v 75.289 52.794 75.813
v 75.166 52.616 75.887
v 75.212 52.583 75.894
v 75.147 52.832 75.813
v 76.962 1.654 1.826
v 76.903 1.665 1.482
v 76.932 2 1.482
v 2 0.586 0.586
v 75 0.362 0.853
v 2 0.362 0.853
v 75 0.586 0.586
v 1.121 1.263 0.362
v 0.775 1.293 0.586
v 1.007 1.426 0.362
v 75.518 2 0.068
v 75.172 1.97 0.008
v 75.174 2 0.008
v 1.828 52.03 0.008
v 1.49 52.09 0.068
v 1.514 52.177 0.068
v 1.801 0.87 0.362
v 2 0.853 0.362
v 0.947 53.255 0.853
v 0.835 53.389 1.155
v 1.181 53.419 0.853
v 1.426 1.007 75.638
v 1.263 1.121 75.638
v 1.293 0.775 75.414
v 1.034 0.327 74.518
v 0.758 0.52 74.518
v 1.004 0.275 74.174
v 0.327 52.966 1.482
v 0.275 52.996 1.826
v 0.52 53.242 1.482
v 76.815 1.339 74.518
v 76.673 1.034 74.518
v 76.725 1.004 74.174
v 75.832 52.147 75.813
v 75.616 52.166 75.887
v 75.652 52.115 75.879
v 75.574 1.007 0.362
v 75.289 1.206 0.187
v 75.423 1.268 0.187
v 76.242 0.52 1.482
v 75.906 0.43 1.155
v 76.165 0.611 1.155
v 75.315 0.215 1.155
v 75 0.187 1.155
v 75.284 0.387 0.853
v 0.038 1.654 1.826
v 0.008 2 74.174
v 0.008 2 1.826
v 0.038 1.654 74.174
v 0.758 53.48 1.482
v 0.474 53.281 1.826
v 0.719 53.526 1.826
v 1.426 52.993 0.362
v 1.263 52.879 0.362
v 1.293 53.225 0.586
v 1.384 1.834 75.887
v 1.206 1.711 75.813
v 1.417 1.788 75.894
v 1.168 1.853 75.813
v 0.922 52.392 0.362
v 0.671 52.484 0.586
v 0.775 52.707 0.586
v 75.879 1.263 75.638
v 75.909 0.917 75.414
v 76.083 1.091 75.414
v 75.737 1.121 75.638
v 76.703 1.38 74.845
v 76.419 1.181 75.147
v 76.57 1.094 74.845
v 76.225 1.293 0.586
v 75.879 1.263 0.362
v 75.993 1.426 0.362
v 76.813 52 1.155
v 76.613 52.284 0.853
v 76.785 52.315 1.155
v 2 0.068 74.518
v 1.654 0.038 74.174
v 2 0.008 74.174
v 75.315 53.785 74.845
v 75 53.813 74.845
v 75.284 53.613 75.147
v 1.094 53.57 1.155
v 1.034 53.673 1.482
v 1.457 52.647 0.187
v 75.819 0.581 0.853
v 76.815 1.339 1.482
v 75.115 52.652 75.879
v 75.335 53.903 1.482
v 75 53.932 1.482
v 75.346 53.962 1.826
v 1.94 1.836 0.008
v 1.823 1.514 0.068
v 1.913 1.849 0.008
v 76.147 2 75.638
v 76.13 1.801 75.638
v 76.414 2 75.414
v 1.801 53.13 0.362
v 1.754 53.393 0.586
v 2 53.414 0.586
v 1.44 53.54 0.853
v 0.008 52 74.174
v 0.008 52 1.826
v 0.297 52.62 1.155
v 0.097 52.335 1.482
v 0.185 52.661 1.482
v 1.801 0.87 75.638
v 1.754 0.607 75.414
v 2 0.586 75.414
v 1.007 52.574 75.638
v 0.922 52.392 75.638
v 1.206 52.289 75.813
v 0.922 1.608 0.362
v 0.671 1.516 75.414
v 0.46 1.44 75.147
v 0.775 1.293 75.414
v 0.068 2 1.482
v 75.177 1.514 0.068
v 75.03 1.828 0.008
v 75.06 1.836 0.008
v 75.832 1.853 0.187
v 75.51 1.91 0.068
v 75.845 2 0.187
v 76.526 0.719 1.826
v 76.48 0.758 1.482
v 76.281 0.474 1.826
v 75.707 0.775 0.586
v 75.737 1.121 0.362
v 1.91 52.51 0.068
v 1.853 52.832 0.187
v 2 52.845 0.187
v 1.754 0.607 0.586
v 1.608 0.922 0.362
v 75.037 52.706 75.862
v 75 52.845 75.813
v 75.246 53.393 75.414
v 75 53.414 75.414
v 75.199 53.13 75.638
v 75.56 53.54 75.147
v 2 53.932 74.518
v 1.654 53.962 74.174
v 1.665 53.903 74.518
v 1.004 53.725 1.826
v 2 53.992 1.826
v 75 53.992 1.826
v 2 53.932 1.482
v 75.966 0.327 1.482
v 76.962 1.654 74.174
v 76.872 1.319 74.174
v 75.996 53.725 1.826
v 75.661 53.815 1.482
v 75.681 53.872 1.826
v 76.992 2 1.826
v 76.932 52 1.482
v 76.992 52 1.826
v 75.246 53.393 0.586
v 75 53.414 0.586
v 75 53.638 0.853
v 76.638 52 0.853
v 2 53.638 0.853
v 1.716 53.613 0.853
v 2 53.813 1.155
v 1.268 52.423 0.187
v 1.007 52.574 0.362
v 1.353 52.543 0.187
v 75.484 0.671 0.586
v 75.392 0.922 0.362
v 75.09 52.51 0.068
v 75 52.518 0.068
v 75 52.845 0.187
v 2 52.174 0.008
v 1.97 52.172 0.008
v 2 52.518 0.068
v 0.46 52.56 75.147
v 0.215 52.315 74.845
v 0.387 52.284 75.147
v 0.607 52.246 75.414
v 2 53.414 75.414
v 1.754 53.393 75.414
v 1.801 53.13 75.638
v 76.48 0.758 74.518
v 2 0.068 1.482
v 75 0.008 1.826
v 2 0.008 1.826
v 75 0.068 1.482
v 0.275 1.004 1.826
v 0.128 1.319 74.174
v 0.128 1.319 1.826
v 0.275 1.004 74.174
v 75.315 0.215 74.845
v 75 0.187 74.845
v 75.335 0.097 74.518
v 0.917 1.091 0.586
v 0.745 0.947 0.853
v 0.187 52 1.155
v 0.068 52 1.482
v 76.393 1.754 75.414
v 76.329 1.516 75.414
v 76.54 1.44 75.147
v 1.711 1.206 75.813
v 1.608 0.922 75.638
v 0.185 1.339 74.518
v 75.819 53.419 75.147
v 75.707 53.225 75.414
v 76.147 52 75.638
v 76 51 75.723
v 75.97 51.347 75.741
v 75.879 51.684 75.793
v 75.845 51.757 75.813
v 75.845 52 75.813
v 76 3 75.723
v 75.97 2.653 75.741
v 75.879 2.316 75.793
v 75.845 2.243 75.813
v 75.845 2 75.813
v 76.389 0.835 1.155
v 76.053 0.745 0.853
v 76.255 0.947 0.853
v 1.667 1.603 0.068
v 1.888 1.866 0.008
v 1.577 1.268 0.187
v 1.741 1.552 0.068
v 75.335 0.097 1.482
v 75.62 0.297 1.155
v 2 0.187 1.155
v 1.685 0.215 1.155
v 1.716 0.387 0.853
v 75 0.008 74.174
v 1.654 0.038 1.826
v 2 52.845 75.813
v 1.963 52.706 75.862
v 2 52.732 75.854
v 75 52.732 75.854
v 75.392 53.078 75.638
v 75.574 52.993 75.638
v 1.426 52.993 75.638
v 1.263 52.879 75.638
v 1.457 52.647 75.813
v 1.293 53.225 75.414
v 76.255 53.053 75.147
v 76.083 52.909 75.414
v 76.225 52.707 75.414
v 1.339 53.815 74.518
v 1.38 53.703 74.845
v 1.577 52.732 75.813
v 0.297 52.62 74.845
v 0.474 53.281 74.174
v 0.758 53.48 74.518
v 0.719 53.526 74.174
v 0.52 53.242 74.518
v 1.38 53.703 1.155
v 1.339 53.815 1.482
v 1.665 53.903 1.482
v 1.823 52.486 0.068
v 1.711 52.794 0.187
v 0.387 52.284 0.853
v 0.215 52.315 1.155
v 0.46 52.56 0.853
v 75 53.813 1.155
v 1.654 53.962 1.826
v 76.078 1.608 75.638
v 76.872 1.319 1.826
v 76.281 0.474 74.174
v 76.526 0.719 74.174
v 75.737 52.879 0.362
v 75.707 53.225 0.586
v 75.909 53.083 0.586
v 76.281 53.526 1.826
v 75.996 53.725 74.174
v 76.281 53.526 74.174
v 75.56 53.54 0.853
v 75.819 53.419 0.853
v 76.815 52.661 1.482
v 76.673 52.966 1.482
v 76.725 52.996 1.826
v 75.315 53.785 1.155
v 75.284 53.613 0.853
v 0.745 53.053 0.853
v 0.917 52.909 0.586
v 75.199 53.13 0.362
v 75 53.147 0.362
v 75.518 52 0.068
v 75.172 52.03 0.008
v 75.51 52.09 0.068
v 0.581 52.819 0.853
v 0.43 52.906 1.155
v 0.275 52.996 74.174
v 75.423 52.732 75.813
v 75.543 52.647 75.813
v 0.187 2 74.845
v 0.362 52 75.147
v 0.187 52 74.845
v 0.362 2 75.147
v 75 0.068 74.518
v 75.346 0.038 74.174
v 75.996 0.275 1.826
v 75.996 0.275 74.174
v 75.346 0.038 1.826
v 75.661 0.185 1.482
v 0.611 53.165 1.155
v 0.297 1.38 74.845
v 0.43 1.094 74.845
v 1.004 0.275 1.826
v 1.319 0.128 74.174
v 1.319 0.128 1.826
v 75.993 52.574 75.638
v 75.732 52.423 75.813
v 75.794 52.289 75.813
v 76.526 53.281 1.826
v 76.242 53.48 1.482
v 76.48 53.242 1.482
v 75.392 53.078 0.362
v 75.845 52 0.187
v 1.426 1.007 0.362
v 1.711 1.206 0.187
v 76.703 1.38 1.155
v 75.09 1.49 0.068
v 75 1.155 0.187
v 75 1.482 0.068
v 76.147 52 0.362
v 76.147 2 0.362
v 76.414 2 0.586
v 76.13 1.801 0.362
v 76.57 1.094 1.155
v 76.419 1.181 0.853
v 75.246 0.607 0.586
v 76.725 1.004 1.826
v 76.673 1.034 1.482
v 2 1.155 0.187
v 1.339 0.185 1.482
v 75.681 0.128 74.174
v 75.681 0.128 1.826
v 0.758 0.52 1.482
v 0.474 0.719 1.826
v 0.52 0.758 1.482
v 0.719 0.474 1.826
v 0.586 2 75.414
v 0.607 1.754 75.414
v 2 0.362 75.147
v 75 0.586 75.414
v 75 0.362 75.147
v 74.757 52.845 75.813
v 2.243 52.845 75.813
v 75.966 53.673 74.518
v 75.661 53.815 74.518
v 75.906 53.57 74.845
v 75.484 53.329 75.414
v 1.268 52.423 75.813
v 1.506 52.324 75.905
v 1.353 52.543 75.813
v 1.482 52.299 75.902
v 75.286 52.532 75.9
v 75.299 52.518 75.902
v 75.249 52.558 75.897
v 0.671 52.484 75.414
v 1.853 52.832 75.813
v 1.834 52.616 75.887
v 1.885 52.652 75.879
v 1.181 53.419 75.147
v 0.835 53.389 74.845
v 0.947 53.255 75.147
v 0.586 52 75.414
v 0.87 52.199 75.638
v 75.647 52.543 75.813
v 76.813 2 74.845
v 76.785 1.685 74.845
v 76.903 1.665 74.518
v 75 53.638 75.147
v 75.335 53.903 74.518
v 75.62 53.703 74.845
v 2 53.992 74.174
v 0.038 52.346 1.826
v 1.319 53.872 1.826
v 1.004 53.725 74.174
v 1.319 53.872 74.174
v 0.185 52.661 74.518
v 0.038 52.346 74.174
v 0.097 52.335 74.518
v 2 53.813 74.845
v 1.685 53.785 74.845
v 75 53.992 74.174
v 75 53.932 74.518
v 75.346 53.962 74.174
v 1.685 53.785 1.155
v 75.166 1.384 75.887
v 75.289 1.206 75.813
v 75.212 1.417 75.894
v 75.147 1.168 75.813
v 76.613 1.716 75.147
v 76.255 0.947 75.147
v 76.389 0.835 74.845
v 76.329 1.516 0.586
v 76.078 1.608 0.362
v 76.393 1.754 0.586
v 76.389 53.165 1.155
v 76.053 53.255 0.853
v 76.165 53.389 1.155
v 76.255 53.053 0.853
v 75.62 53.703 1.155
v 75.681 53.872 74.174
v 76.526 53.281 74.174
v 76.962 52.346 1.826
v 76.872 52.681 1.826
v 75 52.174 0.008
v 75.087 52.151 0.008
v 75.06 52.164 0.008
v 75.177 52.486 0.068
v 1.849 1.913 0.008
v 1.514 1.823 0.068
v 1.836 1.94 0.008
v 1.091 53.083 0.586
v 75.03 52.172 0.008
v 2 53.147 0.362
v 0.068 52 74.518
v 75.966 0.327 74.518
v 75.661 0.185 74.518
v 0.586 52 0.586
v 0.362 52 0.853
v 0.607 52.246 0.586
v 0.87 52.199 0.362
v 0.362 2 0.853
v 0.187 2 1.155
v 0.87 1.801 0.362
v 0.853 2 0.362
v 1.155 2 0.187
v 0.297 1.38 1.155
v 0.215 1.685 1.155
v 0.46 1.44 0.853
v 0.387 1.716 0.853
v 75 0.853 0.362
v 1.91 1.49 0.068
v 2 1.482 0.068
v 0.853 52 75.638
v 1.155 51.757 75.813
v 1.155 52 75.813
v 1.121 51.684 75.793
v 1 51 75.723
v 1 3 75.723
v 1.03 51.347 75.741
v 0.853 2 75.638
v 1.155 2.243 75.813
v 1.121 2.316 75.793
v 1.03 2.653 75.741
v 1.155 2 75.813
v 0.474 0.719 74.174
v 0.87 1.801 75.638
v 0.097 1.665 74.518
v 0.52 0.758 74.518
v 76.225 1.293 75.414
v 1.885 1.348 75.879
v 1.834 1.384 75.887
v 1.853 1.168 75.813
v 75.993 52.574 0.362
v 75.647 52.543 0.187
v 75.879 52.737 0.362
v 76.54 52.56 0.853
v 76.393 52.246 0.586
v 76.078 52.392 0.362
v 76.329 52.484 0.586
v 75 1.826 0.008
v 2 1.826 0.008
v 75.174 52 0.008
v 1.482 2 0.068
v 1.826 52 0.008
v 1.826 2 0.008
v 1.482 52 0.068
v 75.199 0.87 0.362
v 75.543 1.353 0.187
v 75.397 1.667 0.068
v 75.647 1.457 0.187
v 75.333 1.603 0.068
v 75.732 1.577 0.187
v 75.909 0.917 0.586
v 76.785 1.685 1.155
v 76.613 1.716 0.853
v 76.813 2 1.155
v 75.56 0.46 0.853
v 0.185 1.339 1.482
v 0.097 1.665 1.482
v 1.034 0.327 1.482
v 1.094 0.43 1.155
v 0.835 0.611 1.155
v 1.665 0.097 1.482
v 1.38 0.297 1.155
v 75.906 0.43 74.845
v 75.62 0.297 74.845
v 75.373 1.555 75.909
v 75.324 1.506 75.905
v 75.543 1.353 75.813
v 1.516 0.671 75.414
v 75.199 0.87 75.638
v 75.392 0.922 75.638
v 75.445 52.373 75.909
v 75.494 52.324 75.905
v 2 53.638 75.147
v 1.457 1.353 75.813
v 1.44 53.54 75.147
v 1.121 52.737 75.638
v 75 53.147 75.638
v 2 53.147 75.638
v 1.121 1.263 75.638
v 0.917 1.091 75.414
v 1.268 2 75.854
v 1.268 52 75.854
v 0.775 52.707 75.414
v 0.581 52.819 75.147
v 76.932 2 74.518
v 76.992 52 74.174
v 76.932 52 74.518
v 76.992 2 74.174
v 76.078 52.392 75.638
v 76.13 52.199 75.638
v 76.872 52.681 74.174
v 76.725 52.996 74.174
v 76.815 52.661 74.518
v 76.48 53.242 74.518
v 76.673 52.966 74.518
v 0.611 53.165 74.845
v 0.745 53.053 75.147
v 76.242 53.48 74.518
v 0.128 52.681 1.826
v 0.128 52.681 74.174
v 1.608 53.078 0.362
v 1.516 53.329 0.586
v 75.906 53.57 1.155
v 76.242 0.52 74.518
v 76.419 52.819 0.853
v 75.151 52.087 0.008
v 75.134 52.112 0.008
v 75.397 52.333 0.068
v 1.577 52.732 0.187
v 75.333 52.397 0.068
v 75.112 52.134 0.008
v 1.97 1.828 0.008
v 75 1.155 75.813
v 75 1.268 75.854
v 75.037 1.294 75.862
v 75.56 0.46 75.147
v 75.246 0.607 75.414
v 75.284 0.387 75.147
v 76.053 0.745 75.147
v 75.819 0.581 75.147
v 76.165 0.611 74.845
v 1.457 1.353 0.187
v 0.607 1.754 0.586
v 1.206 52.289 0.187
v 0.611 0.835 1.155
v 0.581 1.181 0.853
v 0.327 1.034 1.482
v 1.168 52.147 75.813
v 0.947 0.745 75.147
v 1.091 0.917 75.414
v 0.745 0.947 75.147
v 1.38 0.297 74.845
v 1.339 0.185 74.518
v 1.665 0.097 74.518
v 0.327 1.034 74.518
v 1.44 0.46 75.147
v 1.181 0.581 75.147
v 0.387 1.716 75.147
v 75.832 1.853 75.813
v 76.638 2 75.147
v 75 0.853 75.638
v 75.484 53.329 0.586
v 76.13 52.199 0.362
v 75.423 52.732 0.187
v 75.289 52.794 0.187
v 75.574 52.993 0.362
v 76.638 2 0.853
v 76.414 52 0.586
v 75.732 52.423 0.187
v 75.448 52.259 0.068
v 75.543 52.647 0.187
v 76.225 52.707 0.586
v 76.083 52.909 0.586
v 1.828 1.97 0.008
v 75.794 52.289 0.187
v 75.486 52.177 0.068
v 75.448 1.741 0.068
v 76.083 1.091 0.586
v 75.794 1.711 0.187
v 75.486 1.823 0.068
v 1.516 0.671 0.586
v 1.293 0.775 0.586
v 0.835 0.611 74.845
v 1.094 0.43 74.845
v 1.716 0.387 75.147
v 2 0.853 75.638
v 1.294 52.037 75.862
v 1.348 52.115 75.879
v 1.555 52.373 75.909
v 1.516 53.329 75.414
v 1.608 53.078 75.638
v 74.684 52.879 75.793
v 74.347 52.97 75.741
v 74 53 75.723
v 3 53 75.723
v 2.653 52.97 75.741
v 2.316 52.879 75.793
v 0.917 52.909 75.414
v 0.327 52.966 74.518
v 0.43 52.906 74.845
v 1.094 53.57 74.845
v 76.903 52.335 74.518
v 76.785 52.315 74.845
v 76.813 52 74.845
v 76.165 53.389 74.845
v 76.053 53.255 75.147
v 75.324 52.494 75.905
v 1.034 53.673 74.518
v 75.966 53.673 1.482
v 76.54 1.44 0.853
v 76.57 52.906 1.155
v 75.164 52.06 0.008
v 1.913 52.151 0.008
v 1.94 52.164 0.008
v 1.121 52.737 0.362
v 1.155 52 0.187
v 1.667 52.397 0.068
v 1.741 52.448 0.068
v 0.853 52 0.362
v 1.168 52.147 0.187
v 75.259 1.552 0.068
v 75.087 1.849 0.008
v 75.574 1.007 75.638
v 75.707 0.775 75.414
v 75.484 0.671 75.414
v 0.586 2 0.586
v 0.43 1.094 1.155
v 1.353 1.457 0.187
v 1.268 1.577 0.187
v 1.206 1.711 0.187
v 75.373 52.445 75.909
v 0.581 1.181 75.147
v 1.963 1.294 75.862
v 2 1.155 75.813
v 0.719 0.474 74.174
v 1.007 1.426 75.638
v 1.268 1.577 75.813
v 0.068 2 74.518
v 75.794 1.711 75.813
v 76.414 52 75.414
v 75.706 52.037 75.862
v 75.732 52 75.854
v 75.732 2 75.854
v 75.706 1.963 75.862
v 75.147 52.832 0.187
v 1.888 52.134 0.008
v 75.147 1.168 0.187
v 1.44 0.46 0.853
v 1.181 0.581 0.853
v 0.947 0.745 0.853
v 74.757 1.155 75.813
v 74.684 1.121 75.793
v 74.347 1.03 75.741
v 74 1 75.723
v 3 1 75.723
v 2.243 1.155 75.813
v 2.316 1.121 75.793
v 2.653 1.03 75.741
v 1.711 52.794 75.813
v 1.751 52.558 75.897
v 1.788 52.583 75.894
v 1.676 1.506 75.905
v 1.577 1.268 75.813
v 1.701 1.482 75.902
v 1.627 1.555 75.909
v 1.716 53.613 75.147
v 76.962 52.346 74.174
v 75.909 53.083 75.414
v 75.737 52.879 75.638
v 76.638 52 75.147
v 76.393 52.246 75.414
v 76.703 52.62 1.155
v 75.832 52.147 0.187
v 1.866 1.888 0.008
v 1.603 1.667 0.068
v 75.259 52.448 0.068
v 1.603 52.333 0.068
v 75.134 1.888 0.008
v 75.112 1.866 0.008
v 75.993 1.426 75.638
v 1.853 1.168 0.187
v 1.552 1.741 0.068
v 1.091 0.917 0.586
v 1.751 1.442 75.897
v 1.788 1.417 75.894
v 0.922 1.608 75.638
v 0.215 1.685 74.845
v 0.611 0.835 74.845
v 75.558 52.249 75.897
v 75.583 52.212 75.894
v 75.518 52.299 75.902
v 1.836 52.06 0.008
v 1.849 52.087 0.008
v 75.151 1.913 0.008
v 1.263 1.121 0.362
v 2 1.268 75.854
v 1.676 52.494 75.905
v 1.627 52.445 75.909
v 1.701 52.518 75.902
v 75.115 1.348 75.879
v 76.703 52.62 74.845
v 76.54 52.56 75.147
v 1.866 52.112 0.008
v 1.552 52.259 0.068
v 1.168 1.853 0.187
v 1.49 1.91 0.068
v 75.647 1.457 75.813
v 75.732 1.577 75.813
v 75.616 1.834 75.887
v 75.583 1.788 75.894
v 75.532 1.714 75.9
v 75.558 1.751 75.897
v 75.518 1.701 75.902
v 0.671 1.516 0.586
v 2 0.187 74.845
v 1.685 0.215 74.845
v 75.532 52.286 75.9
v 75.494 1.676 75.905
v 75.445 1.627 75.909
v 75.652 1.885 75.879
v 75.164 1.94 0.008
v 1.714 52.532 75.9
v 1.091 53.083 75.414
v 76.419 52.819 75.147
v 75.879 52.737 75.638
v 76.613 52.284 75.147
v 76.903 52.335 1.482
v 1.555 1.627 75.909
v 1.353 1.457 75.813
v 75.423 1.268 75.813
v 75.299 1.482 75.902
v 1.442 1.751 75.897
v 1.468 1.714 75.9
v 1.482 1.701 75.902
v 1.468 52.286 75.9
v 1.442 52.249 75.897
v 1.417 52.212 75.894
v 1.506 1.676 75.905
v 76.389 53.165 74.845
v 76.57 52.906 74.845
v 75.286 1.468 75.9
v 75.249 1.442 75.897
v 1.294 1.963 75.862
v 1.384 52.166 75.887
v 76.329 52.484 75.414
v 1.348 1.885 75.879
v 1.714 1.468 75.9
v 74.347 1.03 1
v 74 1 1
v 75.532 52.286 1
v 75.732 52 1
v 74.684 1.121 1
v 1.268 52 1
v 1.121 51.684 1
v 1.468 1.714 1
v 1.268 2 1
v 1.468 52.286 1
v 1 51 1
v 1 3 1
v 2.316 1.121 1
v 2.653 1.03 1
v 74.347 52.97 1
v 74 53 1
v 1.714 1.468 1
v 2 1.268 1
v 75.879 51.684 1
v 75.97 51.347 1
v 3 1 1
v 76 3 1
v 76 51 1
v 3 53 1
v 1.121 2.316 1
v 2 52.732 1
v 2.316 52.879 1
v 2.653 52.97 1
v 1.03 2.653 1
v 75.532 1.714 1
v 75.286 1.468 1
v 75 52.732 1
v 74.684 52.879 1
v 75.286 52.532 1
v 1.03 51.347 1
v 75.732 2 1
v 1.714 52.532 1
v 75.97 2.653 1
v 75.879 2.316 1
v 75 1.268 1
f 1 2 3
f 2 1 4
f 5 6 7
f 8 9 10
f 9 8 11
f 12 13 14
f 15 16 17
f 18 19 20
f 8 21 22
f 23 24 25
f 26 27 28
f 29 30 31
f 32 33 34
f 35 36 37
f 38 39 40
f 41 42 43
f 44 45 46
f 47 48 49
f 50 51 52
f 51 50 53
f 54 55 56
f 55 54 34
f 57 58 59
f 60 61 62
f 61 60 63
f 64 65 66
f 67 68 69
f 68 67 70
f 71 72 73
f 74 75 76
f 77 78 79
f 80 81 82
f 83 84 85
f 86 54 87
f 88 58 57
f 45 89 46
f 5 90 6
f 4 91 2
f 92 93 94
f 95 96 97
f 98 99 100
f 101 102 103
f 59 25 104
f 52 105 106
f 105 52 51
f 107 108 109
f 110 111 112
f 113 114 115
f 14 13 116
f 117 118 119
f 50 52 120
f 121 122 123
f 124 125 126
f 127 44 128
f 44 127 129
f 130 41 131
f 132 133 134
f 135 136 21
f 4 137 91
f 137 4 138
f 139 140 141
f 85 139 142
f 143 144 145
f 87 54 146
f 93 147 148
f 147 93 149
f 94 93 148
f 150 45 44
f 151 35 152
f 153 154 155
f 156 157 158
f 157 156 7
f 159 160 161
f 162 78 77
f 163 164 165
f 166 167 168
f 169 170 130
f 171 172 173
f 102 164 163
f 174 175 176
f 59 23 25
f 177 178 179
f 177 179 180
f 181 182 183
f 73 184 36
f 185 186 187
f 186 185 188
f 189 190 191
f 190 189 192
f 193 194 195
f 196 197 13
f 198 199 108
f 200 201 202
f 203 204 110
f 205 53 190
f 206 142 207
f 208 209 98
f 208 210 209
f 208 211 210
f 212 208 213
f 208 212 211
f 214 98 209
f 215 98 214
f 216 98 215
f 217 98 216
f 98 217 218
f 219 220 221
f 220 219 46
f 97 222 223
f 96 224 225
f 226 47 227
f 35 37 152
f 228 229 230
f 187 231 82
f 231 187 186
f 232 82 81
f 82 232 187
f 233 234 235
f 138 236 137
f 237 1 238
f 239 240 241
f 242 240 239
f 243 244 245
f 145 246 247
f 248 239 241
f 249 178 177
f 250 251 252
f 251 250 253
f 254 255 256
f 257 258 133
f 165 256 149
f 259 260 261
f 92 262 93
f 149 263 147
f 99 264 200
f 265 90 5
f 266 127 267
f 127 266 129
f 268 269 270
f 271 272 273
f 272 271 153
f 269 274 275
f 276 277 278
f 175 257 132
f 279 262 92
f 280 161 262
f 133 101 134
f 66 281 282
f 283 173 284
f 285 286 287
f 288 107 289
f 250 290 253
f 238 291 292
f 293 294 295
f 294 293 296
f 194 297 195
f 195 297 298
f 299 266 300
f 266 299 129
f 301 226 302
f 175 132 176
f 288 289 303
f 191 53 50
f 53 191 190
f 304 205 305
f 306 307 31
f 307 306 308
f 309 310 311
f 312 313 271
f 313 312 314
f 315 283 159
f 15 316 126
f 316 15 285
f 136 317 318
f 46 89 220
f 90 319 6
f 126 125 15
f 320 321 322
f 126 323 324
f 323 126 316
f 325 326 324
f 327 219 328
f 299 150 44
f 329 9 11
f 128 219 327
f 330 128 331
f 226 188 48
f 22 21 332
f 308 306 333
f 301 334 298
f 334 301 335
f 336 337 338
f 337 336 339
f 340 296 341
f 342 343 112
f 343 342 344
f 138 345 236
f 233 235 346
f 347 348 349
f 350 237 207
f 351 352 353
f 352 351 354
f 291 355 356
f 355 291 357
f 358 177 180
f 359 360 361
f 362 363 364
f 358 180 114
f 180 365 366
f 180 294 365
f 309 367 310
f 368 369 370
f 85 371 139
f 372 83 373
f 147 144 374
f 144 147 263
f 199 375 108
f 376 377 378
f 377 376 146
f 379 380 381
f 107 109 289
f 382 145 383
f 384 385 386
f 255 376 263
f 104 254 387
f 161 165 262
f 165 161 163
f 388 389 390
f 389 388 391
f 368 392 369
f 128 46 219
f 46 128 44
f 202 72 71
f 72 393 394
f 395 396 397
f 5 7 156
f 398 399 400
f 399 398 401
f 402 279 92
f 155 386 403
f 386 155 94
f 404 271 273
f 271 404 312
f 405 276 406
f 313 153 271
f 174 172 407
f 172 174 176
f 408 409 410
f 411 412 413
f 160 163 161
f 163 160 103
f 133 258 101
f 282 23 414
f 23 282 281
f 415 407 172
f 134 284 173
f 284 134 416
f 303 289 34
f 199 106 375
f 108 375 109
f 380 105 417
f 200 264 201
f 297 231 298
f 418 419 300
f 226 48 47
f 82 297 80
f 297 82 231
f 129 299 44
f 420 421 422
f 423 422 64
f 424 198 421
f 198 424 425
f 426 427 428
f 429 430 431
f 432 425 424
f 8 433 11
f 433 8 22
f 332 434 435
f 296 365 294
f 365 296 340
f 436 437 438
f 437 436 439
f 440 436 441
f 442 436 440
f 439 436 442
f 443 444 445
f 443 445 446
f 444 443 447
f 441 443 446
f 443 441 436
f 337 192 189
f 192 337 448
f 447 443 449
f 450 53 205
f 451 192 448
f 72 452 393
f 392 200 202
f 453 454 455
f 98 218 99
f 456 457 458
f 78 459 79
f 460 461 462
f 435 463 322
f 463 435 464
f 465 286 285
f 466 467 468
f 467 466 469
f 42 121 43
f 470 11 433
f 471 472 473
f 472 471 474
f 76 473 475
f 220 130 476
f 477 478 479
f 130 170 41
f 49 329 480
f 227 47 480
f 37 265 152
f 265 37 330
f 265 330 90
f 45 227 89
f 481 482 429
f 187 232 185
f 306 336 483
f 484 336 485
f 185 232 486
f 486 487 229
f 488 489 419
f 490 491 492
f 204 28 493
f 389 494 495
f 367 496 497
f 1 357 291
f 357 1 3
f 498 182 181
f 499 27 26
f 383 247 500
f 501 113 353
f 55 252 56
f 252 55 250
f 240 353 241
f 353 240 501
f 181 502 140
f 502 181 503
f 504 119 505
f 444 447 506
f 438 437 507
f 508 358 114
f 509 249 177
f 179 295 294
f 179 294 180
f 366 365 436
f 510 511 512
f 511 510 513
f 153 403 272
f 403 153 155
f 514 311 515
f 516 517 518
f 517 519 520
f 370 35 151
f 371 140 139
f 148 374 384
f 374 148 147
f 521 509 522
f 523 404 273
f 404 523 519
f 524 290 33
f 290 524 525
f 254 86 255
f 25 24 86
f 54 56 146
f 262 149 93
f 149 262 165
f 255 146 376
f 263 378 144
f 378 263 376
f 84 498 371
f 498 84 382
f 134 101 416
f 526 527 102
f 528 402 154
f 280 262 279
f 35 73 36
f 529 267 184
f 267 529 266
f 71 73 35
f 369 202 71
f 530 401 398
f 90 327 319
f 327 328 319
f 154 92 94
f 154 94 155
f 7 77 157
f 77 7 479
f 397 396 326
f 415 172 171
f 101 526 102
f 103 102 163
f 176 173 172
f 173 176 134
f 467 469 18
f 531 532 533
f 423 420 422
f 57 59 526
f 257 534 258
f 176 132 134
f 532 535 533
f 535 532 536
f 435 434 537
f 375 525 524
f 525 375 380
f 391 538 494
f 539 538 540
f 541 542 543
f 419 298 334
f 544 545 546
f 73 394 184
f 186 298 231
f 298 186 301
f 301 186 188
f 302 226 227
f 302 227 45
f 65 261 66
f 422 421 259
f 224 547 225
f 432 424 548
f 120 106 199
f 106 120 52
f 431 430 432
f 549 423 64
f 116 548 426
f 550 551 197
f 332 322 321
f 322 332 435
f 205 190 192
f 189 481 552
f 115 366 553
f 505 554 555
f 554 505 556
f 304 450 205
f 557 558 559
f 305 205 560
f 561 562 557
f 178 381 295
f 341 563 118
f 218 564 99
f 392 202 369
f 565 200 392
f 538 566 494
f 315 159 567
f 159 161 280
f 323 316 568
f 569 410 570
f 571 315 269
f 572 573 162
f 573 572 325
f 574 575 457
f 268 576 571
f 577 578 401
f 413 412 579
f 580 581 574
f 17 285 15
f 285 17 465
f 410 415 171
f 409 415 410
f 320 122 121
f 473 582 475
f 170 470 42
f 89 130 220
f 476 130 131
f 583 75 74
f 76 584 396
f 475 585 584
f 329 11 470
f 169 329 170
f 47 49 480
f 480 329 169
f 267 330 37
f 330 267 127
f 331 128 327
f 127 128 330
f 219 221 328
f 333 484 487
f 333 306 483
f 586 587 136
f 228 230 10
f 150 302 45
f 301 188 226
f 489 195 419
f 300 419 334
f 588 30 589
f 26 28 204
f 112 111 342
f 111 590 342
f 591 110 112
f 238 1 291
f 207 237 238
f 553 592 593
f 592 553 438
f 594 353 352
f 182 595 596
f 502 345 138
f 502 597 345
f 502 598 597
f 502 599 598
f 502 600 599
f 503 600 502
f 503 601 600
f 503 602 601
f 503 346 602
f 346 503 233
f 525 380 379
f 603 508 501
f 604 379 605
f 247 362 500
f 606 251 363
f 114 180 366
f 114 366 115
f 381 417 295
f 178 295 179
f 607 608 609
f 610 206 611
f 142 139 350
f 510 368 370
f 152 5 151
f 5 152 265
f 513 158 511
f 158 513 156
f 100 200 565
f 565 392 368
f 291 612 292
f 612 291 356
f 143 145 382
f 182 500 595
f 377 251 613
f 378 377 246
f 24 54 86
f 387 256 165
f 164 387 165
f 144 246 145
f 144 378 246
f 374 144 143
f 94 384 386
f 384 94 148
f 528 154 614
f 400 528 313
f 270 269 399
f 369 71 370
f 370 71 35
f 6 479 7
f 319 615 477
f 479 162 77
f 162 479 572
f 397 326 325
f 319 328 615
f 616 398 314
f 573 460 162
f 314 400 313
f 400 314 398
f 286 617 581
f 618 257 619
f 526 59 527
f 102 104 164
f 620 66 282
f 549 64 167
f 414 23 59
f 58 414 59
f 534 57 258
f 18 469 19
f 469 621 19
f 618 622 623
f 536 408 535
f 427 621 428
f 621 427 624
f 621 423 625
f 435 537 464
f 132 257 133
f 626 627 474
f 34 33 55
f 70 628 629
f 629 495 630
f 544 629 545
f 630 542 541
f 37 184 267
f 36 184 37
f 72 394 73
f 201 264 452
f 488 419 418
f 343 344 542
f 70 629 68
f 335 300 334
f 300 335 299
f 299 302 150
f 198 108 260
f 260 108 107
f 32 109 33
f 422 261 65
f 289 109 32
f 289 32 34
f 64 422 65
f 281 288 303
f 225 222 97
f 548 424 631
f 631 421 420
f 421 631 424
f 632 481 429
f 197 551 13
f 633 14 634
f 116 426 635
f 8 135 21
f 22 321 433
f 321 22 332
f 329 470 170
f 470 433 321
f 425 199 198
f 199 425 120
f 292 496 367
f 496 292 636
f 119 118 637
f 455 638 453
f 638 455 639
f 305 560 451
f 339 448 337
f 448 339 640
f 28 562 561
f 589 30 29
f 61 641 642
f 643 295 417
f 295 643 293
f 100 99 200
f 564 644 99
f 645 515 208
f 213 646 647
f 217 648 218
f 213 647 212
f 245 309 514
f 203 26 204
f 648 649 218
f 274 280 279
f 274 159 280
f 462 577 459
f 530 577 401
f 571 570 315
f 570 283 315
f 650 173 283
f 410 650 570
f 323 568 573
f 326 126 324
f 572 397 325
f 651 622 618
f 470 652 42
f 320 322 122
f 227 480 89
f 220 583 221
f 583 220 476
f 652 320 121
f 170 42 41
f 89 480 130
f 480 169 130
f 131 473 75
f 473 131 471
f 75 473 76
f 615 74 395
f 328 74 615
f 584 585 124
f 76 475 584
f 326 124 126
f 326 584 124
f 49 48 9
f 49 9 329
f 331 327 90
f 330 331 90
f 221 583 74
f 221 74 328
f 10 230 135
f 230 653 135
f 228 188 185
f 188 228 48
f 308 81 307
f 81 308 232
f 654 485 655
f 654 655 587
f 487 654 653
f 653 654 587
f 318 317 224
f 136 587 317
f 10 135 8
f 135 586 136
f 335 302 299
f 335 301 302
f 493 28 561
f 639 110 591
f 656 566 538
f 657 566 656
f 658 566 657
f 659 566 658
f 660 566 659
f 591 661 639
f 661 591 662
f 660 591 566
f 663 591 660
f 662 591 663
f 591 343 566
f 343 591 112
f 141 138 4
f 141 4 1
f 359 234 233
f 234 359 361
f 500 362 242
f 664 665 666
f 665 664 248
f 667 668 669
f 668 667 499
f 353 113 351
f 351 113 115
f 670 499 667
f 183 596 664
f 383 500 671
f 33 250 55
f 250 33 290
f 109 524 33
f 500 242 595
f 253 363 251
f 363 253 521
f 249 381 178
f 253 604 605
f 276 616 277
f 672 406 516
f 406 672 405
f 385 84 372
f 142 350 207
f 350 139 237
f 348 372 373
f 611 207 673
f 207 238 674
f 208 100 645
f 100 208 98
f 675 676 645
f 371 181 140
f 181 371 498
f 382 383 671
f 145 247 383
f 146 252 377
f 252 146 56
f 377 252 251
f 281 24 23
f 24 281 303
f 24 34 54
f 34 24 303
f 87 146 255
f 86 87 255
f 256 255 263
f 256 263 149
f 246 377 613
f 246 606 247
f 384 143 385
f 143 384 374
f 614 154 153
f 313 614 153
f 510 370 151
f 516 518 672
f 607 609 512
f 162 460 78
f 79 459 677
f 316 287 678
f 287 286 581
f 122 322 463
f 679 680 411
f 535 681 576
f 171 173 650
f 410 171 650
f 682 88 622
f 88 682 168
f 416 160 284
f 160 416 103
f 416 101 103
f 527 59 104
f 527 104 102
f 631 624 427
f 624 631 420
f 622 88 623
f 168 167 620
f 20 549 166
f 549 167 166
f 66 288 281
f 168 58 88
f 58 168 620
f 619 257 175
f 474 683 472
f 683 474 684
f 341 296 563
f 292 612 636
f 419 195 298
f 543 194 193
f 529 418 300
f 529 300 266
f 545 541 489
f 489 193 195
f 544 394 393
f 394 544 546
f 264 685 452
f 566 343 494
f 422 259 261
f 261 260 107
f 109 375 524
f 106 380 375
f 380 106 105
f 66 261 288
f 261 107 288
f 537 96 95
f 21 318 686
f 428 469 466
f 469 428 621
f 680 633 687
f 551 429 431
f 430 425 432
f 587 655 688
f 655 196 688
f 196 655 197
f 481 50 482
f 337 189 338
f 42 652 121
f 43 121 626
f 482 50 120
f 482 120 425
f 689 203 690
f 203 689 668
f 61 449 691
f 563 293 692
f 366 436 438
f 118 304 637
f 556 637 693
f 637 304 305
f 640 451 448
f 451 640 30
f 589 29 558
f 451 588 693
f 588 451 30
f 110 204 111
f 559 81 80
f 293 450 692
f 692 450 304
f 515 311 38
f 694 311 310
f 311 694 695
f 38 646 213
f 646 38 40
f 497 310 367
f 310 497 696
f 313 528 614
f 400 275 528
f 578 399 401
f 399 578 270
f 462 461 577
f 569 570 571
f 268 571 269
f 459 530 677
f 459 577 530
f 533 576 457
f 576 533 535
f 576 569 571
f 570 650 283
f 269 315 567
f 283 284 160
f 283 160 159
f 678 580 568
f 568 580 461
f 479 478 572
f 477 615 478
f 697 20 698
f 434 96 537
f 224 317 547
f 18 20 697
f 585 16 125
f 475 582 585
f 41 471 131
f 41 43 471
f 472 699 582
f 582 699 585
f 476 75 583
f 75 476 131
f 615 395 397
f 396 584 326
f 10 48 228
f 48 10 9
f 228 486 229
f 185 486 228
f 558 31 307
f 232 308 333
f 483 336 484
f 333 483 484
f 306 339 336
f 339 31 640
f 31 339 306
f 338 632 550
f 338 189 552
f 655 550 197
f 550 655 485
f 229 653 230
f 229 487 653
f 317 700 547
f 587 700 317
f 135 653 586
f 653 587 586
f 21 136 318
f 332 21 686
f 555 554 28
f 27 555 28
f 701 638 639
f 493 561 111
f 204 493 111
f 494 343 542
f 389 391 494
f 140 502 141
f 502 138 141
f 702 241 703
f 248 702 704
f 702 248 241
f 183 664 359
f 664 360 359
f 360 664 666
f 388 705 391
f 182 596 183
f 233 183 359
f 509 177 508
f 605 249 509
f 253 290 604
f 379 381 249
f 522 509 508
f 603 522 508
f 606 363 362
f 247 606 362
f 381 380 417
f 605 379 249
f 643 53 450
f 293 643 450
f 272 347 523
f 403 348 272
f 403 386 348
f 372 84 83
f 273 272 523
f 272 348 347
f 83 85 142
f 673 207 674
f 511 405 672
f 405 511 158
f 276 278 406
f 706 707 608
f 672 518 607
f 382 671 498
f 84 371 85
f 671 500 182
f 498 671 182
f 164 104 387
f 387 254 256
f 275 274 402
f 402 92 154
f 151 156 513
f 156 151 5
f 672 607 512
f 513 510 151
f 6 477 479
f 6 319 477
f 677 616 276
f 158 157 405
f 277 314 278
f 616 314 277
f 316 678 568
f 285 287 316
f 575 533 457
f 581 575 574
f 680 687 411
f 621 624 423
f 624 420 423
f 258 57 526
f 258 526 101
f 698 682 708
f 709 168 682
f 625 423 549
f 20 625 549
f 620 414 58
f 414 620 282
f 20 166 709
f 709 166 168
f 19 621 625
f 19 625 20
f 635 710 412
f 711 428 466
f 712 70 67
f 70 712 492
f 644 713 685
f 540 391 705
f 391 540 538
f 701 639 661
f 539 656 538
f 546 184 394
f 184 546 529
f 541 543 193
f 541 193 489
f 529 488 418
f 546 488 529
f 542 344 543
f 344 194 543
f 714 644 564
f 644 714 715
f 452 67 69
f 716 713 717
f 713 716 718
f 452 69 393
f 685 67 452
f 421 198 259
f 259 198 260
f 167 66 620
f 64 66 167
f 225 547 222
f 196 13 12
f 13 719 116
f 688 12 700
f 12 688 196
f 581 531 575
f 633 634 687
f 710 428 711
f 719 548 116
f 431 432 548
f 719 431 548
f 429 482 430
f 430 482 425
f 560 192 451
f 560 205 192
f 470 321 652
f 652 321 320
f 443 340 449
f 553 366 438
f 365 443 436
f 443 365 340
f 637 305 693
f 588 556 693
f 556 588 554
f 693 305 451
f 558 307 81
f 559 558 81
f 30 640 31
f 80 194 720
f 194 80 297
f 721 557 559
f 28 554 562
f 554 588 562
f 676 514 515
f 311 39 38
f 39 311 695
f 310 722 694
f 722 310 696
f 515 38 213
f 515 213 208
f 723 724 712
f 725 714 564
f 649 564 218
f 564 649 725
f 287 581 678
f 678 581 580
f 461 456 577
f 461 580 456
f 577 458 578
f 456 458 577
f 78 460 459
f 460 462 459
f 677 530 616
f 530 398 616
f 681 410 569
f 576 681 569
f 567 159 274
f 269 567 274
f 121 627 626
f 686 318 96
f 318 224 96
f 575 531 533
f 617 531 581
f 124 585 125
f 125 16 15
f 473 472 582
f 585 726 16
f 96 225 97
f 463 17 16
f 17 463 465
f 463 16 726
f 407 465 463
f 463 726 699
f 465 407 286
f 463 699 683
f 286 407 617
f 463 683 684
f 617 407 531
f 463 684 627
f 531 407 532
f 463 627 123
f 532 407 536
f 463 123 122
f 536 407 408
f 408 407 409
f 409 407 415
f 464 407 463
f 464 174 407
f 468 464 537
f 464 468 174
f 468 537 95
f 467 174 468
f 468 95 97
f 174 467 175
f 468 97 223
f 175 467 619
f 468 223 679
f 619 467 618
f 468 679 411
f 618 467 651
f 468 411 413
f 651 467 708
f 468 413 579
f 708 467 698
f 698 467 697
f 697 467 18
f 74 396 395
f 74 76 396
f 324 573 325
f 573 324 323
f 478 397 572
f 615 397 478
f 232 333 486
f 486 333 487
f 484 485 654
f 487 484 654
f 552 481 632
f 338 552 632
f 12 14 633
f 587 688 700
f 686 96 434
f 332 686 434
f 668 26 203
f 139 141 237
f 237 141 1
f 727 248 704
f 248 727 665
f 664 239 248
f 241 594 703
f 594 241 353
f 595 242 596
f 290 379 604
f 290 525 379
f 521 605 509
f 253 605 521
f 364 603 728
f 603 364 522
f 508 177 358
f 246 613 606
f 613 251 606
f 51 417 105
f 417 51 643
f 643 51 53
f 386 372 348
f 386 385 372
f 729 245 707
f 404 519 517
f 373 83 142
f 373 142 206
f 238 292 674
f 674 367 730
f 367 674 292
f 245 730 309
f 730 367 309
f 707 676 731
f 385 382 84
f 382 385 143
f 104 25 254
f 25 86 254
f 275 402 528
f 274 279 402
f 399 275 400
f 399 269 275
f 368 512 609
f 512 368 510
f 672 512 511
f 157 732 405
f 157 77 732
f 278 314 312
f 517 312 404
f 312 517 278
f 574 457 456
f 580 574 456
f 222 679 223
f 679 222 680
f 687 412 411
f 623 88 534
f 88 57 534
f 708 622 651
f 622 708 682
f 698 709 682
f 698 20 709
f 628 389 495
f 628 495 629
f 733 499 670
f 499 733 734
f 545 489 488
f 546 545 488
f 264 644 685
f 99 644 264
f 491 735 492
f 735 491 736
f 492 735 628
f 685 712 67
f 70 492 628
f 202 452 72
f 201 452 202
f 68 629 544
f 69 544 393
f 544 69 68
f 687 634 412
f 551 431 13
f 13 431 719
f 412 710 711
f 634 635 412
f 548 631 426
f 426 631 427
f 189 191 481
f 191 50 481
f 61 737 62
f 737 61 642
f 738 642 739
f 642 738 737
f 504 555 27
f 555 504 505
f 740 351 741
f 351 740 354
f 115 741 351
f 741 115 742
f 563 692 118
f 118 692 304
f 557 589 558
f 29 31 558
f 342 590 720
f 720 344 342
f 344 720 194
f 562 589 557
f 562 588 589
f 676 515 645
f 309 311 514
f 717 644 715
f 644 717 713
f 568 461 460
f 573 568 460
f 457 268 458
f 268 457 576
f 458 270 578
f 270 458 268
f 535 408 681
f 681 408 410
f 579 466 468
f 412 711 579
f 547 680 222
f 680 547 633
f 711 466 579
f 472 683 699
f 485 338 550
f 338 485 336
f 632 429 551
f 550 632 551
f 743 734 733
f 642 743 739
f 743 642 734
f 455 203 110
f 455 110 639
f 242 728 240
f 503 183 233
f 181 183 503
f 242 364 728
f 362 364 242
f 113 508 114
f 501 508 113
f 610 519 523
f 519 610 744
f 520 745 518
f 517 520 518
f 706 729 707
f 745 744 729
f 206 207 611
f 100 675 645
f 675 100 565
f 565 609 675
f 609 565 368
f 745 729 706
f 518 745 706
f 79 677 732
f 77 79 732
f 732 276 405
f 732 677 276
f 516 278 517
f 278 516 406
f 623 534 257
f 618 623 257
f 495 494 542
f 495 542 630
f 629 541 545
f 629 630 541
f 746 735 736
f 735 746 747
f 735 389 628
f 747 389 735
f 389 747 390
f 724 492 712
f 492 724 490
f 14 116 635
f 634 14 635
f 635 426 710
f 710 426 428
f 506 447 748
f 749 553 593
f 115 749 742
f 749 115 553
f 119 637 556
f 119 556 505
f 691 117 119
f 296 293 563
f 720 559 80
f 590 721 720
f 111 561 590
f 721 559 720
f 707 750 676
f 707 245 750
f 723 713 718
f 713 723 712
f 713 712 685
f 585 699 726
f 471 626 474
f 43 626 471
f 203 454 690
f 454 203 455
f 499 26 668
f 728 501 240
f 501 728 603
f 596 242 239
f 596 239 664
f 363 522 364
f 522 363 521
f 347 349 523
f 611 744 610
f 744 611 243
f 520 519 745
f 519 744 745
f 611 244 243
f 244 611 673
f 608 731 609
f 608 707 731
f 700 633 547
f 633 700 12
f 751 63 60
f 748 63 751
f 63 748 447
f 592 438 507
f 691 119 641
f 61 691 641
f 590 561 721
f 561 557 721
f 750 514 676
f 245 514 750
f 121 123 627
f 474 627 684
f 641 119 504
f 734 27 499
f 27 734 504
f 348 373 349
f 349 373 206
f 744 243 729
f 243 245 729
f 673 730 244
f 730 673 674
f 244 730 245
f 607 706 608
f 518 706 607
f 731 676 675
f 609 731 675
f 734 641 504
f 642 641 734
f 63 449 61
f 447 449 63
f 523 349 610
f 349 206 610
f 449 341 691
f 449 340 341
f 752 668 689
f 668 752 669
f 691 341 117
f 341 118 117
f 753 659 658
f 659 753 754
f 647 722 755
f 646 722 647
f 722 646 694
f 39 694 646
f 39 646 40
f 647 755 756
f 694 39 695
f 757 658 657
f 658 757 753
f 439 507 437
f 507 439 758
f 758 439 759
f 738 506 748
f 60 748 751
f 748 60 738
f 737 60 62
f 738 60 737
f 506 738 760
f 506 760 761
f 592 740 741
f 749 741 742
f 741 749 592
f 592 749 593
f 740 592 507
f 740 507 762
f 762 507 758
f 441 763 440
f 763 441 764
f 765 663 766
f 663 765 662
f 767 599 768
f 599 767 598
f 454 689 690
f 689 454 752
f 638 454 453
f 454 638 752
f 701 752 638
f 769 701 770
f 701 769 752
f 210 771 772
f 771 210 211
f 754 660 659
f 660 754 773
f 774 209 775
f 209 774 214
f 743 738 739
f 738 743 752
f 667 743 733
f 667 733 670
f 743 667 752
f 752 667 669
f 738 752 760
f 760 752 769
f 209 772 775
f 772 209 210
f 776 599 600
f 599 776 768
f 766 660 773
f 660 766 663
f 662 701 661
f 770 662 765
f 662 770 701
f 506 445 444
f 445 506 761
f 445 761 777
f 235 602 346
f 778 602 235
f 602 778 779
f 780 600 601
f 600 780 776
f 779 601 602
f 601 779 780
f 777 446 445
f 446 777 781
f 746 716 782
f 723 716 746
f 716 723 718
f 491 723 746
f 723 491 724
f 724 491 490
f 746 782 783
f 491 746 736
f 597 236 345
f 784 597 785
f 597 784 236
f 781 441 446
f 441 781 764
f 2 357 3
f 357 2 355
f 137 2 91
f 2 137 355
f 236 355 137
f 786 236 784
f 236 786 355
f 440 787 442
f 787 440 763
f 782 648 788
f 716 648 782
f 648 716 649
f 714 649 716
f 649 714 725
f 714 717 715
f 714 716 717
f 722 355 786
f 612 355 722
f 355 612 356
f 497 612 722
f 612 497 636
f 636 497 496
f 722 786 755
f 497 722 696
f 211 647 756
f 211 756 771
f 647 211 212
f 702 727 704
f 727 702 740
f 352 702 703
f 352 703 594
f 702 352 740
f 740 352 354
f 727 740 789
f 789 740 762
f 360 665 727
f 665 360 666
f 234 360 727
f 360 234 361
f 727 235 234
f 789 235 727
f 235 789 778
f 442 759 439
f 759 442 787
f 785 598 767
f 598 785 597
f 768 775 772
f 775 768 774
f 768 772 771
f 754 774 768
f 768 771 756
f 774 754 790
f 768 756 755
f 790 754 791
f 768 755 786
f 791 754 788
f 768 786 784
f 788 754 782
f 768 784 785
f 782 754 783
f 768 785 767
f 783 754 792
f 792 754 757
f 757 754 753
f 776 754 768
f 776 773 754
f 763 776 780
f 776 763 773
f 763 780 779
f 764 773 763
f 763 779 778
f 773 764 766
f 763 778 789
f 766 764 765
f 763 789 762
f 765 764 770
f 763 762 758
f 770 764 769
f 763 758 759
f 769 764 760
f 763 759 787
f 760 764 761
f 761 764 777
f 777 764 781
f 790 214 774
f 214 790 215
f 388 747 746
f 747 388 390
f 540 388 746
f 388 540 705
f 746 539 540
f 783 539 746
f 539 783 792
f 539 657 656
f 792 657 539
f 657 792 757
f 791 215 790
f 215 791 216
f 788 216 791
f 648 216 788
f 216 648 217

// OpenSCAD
// Short description for models table
description = "";
version_str = "2.0";

// ----------------------------
// Параметры модели (все размеры в мм)
// ----------------------------
// Коробка делится на N отделов: section 1, section 2, ... section N
// x, y, z - подразумевают внутренние размеры. Внешние размеры вычисляются автоматически.

is_small = false;
// Ширины отсеков (по X). Любое количество
sections_x = is_small ? [10, 20, 30] : [75];
// глубина по Y
inner_y    = is_small ? 20 : 52;
// внутренняя глубина во всех отсеках
inner_h    = is_small ? 10 : 75;
    
// Скругление наружного прямоугольника
radius_r     = 1;          // радиус скругления углов
sec_corner_r = 2;          // радиус скругления углов вырезов секций
minkowski_r  = 2;          // радиус скругления краёв крышки через minkowski

// Толщины
wall_th      = 1.0;          // толщина наружных стенок
divider_th   = 1.0;          // толщина перегородок
bottom_th    = 1.0;          // толщина дна

// Параметры крышки (cap)
cap_top_th        = 1.0;     // толщина верхней пластины крышки
cap_lip_h         = 5;     // высота юбки (захват за стенки)
cap_fit_clearance = 0.0;   // зазор между наружными стенками коробки и внутренней поверхностью юбки
cap_th            = 1.2; // толщина стенки крышки; по умолчанию согласована с margin и зазором

// Насадка крышки: опустить вершины межсекционных перегородок на заданную высоту
// Делает перегородки ниже на Z, чтобы крышка/вкладыш входили без упора в перегородки
sections_to_cap_gap = 5; // мм

// Поправки размеров (фактические измерения)
sec_x_delta   = 0;     // каждая секция по X шире, чем надо
y_delta       = 0;     // каждая секция по Y шире, чем надо

// Флаги печати
print_box = true;     // печатать основание (лоток)
print_cap = false;     // печатать крышку





use <../modules.scad>;

// ----------------------------
// Настройка точности
// ----------------------------
$fn = 0;        // фиксированную сегментацию отключаем
$fa = 6;        // 5–8° обычно достаточно
$fs = 0.35;     // ≈ диаметр сопла (0.3–0.5 для сопла 0.4)
pin_fs = 0.25;  // чуть тоньше для штырей и отверстий

// Эффективные размеры с учётом поправок
sections_x_e = [ for (w = sections_x) w + sec_x_delta ];

// Вспомогательные функции суммирования
function sum_first(v, n, i=0, acc=0) = (i >= n) ? acc : sum_first(v, n, i+1, acc + v[i]);
function vec_sum(v) = sum_first(v, len(v));

cap_h = cap_top_th + cap_lip_h;   // итоговая высота крышки

// Предвычисленные вспомогательные величины (для читаемости, без изменения формул)
n_sections = len(sections_x_e);
sum_sections_x = vec_sum(sections_x_e);
outer_margin_eff = cap_fit_clearance + cap_th; // посадка крышки
cap_h_target = cap_top_th + cap_lip_h;

// ----------------------------
// Геометрия корпуса
// ----------------------------
// Общая ширина X: стены + сумма секций + перегородки между ними
inner_y_e = inner_y + y_delta;
outer_x = 2*wall_th + sum_sections_x + divider_th * max(n_sections - 1, 0);
outer_y = 2*wall_th + inner_y_e;
outer_h = bottom_th + inner_h;

// Отсеки формируются перегородками; явные вырезы не используются

// Базовый заполняющий объём (без вырезов) — внешний контур на полную высоту
module base_fill(){
    // Только внешний контур на полную высоту; срез верха делаем позже, локально по перегородкам
    rounded_prism(size=[outer_x, outer_y], h=outer_h, r=radius_r);
}

section_x_offset = wall_th;
section_y = wall_th;
// Вырезы-отсеки формируются по массиву sections_x_e
// Позиция i-го отсека: сдвиг от левой стены = сумма предыдущих ширин + перегородки между ними
function section_x_at(i) = section_x_offset + sum_first(sections_x_e, i) + divider_th * i;
module section_at(i){
    translate([section_x_at(i), section_y, bottom_th])
        rounded_prism(size=[sections_x_e[i], inner_y_e], h=inner_h, r=sec_corner_r);
}

module base(){
    // Корпус-лоток как разность наружного корпуса (с опциональным Minkowski) минус секции,
    // а затем локальный срез верхушек перегородок
    difference(){
        // Наружный корпус
        rounded_prism([outer_x, outer_y], outer_h, radius_r, minkowski_r);

        // Вырезы секций по массиву ширин (section 1..N)
        for (i = [0 : n_sections - 1])
            section_at(i);

        // Срезать верх перегородок на заданную высоту, не затрагивая наружные стены
        dividers_top_cut();
    }
}

// Сервис: левый X-край перегородки между секцией i и i+1
function divider_x_at(i) = section_x_at(i) + sections_x_e[i];

// Локальный верхний срез только по перегородкам (полосы шириной divider_th)
module dividers_top_cut(){
    // Безопасный зажим высоты среза: 0..(inner_h-eps)
    g = min(max(sections_to_cap_gap, 0), inner_h);
    if (g > 0 && n_sections > 1){
        for (i = [0 : n_sections - 2])
            translate([
                divider_x_at(i) - sec_corner_r*2,
                wall_th,
                // немного уводим вниз на eps, чтобы исключить выход выше верха
                bottom_th + inner_h - g
            ])
                cube([sec_corner_r*4+divider_th, inner_y_e, g]);
    }
}

// ---------------
// Крышка (cap)
// ---------------
// Крышка состоит из:
// - верхней пластины толщиной cap_top_th, размерами больше корпуса с каждой стороны
// - внутренней юбки высотой cap_lip_h, которая надевается на корпус с зазором cap_fit_clearance
module cap(){
    difference(){
        // Наружный контур с опциональным скруглением краёв
        rounded_prism(
            [outer_x + 2*outer_margin_eff, outer_y + 2*outer_margin_eff],
            h=cap_h_target,
            r=radius_r,
            kr=minkowski_r
        );

        // Внутренняя поверхность юбки (посадка по зазору)
        translate([cap_th, cap_th, 0])
            rounded_prism(
                size=[outer_x + 2*cap_fit_clearance, outer_y + 2*cap_fit_clearance],
                h=cap_lip_h + 2*eps(),
                r=radius_r + cap_fit_clearance
            );
    }
}

// Вывод всех фрагментов
// ----------------------------
module all_parts(){
    // Раскладка деталей по Y при одновременной печати
    x_gap = 10;  // использовать существующий зазор
    y_shift = (print_box && print_cap) ? (outer_y + x_gap) : 0;

    if (print_box) translate([0, 0, 0]) base();
    if (print_cap) translate([0, y_shift, 0]) upside_down(cap_h) cap();
}

// ----------------------------
// ВЫВОД МОДЕЛИ
// ----------------------------
clip_for_fragments(){ all_parts(); }
 
